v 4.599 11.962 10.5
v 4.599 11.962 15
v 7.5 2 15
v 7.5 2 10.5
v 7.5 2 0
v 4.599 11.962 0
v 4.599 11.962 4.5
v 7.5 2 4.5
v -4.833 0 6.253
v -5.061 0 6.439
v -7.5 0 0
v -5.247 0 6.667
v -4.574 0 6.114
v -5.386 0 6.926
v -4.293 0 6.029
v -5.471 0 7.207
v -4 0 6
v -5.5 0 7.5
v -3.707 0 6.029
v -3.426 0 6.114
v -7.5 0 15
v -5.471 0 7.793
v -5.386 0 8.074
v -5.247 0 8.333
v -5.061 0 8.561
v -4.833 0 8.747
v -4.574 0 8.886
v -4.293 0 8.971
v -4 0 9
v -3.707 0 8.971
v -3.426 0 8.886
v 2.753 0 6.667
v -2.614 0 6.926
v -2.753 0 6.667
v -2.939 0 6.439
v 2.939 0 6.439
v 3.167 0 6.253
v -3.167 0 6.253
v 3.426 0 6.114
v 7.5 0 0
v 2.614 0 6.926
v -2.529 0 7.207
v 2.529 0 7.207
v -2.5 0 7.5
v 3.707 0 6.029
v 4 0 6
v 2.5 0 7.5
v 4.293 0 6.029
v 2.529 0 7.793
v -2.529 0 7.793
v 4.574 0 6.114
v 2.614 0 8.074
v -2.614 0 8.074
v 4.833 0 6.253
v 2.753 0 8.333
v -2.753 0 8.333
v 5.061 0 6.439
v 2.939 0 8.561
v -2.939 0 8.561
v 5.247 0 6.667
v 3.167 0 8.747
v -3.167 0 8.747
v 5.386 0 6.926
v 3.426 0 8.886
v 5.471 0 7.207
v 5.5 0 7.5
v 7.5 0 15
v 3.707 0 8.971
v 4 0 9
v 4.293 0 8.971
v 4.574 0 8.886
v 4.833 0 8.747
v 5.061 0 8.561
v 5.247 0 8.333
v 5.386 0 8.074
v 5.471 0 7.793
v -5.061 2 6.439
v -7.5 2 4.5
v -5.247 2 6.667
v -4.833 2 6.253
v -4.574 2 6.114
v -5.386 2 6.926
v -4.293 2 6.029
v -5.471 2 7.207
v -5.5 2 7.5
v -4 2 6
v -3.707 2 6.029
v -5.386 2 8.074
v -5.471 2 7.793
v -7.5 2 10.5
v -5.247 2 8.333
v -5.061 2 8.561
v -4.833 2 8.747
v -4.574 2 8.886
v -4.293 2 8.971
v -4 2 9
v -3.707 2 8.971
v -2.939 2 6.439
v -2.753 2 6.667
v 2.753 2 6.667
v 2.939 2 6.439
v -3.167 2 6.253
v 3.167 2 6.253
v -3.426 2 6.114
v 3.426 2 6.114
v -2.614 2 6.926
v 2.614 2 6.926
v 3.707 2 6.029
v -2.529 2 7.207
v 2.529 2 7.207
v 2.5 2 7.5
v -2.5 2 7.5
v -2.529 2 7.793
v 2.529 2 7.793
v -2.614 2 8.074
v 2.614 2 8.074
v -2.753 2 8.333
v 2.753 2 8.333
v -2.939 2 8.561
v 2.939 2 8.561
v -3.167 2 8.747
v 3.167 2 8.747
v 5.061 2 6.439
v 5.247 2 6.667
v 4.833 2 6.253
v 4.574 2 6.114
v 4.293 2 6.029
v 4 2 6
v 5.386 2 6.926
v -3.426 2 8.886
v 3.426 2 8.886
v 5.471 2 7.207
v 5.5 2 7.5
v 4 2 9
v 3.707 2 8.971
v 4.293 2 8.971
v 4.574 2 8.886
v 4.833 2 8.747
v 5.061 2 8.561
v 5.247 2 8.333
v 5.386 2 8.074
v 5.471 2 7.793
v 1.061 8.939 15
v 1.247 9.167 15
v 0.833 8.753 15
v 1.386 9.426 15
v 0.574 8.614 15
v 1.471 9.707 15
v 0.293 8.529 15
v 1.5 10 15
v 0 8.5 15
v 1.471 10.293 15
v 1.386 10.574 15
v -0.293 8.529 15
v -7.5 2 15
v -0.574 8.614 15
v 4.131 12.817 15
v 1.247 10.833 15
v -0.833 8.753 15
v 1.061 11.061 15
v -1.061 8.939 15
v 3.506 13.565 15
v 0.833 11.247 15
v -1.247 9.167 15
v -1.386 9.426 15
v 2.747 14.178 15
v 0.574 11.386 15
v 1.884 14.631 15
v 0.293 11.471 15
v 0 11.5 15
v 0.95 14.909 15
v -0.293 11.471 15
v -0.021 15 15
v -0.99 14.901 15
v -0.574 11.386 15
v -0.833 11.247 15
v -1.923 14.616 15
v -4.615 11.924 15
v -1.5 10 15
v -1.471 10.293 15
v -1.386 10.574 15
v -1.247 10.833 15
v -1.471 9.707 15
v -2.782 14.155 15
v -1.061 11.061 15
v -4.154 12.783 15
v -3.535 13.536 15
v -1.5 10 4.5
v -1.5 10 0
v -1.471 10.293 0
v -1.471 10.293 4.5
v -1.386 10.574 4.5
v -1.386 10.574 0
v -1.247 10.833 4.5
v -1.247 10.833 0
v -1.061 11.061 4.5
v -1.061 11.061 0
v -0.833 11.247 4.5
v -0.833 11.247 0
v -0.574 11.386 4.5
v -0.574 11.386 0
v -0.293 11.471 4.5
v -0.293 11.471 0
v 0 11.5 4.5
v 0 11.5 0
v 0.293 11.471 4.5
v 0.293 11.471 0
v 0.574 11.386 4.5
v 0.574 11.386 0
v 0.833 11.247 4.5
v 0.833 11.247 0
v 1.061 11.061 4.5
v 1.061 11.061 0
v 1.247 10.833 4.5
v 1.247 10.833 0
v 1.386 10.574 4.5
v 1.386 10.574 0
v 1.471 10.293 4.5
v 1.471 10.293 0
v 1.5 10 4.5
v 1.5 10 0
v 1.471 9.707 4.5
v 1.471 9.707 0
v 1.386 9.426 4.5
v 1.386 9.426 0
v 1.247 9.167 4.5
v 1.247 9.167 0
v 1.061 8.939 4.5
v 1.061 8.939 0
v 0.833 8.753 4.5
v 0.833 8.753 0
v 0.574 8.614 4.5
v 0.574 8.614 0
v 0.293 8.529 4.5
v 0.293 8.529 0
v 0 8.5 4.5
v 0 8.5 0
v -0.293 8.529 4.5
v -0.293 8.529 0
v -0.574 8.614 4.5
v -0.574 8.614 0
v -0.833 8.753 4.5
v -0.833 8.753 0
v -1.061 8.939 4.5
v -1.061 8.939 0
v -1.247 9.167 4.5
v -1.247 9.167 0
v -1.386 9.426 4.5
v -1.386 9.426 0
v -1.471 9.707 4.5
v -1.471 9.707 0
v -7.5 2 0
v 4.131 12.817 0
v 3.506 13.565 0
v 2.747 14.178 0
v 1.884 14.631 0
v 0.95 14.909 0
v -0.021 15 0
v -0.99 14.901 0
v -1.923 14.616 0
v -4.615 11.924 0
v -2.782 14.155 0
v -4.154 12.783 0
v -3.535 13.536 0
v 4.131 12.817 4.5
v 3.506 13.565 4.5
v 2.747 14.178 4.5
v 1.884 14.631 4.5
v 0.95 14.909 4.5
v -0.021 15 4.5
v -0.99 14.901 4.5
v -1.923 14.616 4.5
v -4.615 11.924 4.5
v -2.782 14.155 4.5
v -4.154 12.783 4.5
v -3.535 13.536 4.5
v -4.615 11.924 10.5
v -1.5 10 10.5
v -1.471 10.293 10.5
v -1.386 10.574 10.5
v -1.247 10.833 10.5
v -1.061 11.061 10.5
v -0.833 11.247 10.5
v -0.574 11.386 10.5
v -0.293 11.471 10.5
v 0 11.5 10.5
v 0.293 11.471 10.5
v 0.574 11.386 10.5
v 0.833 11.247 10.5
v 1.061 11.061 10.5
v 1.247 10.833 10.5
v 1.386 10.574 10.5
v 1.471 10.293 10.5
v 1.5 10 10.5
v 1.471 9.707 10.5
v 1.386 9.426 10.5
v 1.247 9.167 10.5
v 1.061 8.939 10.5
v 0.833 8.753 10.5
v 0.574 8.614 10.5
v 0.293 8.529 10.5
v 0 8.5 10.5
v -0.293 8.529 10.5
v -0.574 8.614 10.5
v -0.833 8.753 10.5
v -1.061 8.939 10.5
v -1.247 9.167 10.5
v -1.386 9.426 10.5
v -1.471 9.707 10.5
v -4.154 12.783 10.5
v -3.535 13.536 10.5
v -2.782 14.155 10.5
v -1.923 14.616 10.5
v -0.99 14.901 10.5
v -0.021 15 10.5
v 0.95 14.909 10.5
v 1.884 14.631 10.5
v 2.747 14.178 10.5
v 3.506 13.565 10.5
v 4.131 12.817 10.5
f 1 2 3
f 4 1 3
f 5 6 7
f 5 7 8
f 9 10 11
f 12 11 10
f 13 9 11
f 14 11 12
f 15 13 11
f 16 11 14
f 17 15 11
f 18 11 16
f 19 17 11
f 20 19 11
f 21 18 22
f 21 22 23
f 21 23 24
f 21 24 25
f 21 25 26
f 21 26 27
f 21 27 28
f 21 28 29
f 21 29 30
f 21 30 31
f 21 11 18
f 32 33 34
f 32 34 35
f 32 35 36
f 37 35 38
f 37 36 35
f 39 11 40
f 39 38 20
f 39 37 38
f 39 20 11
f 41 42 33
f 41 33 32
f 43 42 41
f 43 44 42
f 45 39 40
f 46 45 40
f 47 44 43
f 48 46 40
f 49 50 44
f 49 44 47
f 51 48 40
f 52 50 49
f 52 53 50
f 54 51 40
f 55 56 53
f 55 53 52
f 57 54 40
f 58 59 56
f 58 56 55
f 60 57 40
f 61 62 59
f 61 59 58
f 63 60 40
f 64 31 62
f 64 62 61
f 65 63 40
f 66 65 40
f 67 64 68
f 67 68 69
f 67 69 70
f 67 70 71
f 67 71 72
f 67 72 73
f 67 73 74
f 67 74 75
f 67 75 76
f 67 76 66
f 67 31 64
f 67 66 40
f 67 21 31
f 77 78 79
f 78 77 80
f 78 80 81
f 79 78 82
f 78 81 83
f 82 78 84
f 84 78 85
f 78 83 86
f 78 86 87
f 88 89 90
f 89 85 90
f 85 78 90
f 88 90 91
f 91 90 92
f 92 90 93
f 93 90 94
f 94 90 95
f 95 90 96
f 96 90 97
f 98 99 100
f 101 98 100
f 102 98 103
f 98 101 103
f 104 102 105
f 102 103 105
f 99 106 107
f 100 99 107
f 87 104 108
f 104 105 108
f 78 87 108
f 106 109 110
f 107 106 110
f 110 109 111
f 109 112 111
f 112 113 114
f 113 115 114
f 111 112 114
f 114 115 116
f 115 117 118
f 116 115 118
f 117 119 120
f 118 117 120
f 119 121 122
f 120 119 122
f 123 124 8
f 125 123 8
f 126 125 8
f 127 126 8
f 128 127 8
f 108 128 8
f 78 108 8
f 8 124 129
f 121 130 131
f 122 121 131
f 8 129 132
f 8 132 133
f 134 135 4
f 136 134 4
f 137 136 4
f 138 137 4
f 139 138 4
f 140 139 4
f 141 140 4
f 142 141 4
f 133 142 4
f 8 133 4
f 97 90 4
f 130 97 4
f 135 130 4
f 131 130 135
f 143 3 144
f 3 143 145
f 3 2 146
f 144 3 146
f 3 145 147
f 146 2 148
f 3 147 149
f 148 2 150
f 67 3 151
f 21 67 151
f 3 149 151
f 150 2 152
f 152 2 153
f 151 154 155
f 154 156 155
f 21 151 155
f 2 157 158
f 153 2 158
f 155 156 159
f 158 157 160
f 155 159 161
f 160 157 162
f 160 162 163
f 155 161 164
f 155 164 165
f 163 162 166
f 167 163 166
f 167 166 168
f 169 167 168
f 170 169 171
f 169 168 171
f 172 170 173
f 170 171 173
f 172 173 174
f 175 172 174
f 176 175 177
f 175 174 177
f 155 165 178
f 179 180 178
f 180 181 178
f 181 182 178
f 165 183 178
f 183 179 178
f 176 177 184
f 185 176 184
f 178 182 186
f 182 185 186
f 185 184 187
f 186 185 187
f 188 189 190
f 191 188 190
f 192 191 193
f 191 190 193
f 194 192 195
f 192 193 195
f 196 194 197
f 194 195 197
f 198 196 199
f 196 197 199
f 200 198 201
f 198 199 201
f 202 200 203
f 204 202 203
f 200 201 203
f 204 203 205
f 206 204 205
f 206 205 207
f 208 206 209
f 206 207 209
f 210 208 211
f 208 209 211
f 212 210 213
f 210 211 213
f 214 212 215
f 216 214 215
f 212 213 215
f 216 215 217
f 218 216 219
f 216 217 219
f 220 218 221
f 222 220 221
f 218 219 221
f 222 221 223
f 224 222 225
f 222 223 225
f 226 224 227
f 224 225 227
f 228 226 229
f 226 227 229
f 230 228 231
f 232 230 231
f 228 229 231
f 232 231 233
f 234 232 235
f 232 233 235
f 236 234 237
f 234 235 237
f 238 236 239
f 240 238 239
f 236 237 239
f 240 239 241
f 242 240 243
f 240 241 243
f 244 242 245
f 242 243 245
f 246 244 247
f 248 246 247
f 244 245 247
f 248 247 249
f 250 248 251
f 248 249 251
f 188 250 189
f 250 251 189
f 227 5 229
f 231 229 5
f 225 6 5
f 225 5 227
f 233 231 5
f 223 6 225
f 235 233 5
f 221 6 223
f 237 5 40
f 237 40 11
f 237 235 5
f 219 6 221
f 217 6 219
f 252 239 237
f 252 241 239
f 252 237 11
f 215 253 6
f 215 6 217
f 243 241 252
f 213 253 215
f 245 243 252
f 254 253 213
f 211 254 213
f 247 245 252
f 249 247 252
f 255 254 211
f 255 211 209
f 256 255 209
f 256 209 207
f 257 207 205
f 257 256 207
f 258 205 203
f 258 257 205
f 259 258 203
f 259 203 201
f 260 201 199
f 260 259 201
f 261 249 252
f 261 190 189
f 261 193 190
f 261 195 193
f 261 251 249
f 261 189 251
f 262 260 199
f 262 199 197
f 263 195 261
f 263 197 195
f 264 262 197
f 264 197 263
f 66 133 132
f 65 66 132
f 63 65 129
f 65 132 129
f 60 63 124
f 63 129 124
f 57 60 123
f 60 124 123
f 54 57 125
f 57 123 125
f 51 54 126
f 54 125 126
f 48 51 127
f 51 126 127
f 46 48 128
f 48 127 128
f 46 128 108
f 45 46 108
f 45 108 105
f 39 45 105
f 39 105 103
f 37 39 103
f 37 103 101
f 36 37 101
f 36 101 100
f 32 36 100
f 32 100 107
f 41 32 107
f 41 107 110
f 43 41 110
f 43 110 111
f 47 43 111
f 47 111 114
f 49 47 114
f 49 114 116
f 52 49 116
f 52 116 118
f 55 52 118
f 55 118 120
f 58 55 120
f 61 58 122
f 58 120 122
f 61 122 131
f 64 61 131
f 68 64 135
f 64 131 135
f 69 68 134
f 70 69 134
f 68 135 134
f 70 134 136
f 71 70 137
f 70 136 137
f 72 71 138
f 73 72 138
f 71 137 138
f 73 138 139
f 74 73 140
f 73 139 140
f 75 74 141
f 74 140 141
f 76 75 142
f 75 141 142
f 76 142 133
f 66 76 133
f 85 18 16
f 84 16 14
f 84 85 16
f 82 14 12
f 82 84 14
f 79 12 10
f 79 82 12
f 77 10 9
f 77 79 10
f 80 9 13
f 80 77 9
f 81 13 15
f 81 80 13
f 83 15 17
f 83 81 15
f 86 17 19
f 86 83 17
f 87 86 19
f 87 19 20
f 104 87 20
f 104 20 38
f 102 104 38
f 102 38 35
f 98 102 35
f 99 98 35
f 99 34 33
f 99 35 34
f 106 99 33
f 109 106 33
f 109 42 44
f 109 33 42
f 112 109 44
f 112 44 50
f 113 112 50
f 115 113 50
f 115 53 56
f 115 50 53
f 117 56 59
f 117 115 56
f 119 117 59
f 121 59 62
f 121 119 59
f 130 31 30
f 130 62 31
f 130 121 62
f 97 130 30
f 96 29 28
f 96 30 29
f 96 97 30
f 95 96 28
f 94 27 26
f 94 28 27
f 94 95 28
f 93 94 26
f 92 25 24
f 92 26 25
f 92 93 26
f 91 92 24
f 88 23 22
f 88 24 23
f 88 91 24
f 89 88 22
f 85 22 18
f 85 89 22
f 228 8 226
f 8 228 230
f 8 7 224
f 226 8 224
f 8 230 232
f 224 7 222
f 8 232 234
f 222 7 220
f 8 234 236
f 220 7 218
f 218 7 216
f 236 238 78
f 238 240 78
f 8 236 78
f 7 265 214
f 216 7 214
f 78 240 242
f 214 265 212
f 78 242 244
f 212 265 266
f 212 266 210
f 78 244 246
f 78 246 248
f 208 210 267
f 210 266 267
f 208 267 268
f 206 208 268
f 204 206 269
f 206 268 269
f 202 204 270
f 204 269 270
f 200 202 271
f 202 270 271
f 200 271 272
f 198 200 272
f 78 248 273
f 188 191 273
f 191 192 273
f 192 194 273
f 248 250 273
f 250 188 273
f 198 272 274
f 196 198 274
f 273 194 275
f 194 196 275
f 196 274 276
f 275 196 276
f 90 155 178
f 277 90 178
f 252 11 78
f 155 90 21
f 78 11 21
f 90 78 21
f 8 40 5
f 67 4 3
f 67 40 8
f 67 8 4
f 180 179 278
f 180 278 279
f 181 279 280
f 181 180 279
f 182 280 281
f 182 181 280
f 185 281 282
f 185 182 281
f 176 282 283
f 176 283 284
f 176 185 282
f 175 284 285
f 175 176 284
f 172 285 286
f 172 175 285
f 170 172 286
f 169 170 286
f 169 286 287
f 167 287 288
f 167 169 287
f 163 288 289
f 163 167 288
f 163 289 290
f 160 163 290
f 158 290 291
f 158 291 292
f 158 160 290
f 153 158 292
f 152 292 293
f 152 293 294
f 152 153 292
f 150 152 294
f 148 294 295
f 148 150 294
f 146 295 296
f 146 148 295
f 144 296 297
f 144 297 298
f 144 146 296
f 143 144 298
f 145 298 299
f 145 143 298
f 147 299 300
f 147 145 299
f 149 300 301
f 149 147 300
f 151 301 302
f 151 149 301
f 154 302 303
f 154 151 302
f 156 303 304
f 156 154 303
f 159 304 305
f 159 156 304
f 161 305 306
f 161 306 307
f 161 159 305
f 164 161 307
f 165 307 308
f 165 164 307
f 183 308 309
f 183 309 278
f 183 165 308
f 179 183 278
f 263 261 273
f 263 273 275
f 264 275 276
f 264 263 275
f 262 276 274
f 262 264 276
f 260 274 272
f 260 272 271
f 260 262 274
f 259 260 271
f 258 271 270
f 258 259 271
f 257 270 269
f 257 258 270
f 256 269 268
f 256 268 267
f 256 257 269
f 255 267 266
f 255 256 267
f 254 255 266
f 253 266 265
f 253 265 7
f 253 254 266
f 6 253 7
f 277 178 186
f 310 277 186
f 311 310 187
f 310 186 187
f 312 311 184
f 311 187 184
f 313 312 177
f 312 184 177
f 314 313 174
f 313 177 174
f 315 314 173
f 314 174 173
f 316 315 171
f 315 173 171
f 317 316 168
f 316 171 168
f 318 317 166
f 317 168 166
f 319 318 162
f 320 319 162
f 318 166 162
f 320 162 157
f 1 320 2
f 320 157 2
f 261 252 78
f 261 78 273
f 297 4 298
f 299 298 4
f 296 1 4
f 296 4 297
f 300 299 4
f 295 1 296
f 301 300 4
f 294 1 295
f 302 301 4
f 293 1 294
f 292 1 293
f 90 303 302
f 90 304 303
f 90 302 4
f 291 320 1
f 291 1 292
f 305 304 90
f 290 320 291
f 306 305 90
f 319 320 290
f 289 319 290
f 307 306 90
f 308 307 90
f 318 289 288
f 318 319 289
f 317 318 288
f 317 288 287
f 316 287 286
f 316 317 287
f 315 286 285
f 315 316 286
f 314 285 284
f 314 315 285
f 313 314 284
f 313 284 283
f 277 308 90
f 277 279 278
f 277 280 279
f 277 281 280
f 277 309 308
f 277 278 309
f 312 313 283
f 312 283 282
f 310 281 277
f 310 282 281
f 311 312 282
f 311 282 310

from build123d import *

# Parameters (mm, degrees)
SKETCH7_W           = 15
SKETCH7_H           = 7.5
BOSS_EXTRUDE2_DEPTH = 2
SKETCH8_R           = 1.5
BOSS_EXTRUDE3_DEPTH = 4.5
SKETCH9_R           = 1.5
CUT_EXTRUDE1_DEPTH  = 3


with BuildPart() as part:
    # Sketch7 → Boss-Extrude2 (new body)
    with BuildSketch(Plane(origin=(0, 0, 0), x_dir=(1, 0, 0), z_dir=(0, 1, 0))):
        with Locations((0, -3.75)):
            Rectangle(SKETCH7_W, SKETCH7_H)
    boss_extrude2 = extrude(amount=BOSS_EXTRUDE2_DEPTH)

    # Sketch8 → Boss-Extrude3 (add)
    with BuildSketch(Plane(origin=(0, 0, 0), x_dir=(-1, 0, 0), z_dir=(0, 0, -1))):
        with BuildLine():
            Line((-4.598991345, 11.961957852), (-7.5, 2))
            Line((-7.5, 2), (7.5, 2))
            Line((7.5, 2), (4.615024569, 11.923940807))
            ThreePointArc((4.615024569, 11.923940807), (0.020629833, 14.999957441), (-4.598991345, 11.961957852))
        make_face()
        with Locations((0, 10)):
            Circle(SKETCH8_R, mode=Mode.SUBTRACT)
    boss_extrude3 = extrude(amount=-BOSS_EXTRUDE3_DEPTH)

    # Mirror1: Boss-Extrude2, Boss-Extrude3 across plane
    add(boss_extrude2.mirror(Plane(origin=(7.5, 2, 7.5), x_dir=(1, 0, 0), z_dir=(0, 0, -1))))
    add(boss_extrude3.mirror(Plane(origin=(7.5, 2, 7.5), x_dir=(1, 0, 0), z_dir=(0, 0, -1))))

    # Sketch9 → Cut-Extrude1 (cut, through all)
    with BuildSketch(Plane(origin=(0, 2, 0), x_dir=(1, 0, 0), z_dir=(0, 1, 0))):
        with Locations((4, -7.5)):
            Circle(SKETCH9_R)
    cut_extrude1 = extrude(amount=-CUT_EXTRUDE1_DEPTH, mode=Mode.SUBTRACT)

    # Mirror2: Cut-Extrude1 across plane
    add(cut_extrude1.mirror(Plane(origin=(0, 0, 0), x_dir=(0, 0, 1), z_dir=(1, 0, 0))), mode=Mode.SUBTRACT)


solid = part.part
